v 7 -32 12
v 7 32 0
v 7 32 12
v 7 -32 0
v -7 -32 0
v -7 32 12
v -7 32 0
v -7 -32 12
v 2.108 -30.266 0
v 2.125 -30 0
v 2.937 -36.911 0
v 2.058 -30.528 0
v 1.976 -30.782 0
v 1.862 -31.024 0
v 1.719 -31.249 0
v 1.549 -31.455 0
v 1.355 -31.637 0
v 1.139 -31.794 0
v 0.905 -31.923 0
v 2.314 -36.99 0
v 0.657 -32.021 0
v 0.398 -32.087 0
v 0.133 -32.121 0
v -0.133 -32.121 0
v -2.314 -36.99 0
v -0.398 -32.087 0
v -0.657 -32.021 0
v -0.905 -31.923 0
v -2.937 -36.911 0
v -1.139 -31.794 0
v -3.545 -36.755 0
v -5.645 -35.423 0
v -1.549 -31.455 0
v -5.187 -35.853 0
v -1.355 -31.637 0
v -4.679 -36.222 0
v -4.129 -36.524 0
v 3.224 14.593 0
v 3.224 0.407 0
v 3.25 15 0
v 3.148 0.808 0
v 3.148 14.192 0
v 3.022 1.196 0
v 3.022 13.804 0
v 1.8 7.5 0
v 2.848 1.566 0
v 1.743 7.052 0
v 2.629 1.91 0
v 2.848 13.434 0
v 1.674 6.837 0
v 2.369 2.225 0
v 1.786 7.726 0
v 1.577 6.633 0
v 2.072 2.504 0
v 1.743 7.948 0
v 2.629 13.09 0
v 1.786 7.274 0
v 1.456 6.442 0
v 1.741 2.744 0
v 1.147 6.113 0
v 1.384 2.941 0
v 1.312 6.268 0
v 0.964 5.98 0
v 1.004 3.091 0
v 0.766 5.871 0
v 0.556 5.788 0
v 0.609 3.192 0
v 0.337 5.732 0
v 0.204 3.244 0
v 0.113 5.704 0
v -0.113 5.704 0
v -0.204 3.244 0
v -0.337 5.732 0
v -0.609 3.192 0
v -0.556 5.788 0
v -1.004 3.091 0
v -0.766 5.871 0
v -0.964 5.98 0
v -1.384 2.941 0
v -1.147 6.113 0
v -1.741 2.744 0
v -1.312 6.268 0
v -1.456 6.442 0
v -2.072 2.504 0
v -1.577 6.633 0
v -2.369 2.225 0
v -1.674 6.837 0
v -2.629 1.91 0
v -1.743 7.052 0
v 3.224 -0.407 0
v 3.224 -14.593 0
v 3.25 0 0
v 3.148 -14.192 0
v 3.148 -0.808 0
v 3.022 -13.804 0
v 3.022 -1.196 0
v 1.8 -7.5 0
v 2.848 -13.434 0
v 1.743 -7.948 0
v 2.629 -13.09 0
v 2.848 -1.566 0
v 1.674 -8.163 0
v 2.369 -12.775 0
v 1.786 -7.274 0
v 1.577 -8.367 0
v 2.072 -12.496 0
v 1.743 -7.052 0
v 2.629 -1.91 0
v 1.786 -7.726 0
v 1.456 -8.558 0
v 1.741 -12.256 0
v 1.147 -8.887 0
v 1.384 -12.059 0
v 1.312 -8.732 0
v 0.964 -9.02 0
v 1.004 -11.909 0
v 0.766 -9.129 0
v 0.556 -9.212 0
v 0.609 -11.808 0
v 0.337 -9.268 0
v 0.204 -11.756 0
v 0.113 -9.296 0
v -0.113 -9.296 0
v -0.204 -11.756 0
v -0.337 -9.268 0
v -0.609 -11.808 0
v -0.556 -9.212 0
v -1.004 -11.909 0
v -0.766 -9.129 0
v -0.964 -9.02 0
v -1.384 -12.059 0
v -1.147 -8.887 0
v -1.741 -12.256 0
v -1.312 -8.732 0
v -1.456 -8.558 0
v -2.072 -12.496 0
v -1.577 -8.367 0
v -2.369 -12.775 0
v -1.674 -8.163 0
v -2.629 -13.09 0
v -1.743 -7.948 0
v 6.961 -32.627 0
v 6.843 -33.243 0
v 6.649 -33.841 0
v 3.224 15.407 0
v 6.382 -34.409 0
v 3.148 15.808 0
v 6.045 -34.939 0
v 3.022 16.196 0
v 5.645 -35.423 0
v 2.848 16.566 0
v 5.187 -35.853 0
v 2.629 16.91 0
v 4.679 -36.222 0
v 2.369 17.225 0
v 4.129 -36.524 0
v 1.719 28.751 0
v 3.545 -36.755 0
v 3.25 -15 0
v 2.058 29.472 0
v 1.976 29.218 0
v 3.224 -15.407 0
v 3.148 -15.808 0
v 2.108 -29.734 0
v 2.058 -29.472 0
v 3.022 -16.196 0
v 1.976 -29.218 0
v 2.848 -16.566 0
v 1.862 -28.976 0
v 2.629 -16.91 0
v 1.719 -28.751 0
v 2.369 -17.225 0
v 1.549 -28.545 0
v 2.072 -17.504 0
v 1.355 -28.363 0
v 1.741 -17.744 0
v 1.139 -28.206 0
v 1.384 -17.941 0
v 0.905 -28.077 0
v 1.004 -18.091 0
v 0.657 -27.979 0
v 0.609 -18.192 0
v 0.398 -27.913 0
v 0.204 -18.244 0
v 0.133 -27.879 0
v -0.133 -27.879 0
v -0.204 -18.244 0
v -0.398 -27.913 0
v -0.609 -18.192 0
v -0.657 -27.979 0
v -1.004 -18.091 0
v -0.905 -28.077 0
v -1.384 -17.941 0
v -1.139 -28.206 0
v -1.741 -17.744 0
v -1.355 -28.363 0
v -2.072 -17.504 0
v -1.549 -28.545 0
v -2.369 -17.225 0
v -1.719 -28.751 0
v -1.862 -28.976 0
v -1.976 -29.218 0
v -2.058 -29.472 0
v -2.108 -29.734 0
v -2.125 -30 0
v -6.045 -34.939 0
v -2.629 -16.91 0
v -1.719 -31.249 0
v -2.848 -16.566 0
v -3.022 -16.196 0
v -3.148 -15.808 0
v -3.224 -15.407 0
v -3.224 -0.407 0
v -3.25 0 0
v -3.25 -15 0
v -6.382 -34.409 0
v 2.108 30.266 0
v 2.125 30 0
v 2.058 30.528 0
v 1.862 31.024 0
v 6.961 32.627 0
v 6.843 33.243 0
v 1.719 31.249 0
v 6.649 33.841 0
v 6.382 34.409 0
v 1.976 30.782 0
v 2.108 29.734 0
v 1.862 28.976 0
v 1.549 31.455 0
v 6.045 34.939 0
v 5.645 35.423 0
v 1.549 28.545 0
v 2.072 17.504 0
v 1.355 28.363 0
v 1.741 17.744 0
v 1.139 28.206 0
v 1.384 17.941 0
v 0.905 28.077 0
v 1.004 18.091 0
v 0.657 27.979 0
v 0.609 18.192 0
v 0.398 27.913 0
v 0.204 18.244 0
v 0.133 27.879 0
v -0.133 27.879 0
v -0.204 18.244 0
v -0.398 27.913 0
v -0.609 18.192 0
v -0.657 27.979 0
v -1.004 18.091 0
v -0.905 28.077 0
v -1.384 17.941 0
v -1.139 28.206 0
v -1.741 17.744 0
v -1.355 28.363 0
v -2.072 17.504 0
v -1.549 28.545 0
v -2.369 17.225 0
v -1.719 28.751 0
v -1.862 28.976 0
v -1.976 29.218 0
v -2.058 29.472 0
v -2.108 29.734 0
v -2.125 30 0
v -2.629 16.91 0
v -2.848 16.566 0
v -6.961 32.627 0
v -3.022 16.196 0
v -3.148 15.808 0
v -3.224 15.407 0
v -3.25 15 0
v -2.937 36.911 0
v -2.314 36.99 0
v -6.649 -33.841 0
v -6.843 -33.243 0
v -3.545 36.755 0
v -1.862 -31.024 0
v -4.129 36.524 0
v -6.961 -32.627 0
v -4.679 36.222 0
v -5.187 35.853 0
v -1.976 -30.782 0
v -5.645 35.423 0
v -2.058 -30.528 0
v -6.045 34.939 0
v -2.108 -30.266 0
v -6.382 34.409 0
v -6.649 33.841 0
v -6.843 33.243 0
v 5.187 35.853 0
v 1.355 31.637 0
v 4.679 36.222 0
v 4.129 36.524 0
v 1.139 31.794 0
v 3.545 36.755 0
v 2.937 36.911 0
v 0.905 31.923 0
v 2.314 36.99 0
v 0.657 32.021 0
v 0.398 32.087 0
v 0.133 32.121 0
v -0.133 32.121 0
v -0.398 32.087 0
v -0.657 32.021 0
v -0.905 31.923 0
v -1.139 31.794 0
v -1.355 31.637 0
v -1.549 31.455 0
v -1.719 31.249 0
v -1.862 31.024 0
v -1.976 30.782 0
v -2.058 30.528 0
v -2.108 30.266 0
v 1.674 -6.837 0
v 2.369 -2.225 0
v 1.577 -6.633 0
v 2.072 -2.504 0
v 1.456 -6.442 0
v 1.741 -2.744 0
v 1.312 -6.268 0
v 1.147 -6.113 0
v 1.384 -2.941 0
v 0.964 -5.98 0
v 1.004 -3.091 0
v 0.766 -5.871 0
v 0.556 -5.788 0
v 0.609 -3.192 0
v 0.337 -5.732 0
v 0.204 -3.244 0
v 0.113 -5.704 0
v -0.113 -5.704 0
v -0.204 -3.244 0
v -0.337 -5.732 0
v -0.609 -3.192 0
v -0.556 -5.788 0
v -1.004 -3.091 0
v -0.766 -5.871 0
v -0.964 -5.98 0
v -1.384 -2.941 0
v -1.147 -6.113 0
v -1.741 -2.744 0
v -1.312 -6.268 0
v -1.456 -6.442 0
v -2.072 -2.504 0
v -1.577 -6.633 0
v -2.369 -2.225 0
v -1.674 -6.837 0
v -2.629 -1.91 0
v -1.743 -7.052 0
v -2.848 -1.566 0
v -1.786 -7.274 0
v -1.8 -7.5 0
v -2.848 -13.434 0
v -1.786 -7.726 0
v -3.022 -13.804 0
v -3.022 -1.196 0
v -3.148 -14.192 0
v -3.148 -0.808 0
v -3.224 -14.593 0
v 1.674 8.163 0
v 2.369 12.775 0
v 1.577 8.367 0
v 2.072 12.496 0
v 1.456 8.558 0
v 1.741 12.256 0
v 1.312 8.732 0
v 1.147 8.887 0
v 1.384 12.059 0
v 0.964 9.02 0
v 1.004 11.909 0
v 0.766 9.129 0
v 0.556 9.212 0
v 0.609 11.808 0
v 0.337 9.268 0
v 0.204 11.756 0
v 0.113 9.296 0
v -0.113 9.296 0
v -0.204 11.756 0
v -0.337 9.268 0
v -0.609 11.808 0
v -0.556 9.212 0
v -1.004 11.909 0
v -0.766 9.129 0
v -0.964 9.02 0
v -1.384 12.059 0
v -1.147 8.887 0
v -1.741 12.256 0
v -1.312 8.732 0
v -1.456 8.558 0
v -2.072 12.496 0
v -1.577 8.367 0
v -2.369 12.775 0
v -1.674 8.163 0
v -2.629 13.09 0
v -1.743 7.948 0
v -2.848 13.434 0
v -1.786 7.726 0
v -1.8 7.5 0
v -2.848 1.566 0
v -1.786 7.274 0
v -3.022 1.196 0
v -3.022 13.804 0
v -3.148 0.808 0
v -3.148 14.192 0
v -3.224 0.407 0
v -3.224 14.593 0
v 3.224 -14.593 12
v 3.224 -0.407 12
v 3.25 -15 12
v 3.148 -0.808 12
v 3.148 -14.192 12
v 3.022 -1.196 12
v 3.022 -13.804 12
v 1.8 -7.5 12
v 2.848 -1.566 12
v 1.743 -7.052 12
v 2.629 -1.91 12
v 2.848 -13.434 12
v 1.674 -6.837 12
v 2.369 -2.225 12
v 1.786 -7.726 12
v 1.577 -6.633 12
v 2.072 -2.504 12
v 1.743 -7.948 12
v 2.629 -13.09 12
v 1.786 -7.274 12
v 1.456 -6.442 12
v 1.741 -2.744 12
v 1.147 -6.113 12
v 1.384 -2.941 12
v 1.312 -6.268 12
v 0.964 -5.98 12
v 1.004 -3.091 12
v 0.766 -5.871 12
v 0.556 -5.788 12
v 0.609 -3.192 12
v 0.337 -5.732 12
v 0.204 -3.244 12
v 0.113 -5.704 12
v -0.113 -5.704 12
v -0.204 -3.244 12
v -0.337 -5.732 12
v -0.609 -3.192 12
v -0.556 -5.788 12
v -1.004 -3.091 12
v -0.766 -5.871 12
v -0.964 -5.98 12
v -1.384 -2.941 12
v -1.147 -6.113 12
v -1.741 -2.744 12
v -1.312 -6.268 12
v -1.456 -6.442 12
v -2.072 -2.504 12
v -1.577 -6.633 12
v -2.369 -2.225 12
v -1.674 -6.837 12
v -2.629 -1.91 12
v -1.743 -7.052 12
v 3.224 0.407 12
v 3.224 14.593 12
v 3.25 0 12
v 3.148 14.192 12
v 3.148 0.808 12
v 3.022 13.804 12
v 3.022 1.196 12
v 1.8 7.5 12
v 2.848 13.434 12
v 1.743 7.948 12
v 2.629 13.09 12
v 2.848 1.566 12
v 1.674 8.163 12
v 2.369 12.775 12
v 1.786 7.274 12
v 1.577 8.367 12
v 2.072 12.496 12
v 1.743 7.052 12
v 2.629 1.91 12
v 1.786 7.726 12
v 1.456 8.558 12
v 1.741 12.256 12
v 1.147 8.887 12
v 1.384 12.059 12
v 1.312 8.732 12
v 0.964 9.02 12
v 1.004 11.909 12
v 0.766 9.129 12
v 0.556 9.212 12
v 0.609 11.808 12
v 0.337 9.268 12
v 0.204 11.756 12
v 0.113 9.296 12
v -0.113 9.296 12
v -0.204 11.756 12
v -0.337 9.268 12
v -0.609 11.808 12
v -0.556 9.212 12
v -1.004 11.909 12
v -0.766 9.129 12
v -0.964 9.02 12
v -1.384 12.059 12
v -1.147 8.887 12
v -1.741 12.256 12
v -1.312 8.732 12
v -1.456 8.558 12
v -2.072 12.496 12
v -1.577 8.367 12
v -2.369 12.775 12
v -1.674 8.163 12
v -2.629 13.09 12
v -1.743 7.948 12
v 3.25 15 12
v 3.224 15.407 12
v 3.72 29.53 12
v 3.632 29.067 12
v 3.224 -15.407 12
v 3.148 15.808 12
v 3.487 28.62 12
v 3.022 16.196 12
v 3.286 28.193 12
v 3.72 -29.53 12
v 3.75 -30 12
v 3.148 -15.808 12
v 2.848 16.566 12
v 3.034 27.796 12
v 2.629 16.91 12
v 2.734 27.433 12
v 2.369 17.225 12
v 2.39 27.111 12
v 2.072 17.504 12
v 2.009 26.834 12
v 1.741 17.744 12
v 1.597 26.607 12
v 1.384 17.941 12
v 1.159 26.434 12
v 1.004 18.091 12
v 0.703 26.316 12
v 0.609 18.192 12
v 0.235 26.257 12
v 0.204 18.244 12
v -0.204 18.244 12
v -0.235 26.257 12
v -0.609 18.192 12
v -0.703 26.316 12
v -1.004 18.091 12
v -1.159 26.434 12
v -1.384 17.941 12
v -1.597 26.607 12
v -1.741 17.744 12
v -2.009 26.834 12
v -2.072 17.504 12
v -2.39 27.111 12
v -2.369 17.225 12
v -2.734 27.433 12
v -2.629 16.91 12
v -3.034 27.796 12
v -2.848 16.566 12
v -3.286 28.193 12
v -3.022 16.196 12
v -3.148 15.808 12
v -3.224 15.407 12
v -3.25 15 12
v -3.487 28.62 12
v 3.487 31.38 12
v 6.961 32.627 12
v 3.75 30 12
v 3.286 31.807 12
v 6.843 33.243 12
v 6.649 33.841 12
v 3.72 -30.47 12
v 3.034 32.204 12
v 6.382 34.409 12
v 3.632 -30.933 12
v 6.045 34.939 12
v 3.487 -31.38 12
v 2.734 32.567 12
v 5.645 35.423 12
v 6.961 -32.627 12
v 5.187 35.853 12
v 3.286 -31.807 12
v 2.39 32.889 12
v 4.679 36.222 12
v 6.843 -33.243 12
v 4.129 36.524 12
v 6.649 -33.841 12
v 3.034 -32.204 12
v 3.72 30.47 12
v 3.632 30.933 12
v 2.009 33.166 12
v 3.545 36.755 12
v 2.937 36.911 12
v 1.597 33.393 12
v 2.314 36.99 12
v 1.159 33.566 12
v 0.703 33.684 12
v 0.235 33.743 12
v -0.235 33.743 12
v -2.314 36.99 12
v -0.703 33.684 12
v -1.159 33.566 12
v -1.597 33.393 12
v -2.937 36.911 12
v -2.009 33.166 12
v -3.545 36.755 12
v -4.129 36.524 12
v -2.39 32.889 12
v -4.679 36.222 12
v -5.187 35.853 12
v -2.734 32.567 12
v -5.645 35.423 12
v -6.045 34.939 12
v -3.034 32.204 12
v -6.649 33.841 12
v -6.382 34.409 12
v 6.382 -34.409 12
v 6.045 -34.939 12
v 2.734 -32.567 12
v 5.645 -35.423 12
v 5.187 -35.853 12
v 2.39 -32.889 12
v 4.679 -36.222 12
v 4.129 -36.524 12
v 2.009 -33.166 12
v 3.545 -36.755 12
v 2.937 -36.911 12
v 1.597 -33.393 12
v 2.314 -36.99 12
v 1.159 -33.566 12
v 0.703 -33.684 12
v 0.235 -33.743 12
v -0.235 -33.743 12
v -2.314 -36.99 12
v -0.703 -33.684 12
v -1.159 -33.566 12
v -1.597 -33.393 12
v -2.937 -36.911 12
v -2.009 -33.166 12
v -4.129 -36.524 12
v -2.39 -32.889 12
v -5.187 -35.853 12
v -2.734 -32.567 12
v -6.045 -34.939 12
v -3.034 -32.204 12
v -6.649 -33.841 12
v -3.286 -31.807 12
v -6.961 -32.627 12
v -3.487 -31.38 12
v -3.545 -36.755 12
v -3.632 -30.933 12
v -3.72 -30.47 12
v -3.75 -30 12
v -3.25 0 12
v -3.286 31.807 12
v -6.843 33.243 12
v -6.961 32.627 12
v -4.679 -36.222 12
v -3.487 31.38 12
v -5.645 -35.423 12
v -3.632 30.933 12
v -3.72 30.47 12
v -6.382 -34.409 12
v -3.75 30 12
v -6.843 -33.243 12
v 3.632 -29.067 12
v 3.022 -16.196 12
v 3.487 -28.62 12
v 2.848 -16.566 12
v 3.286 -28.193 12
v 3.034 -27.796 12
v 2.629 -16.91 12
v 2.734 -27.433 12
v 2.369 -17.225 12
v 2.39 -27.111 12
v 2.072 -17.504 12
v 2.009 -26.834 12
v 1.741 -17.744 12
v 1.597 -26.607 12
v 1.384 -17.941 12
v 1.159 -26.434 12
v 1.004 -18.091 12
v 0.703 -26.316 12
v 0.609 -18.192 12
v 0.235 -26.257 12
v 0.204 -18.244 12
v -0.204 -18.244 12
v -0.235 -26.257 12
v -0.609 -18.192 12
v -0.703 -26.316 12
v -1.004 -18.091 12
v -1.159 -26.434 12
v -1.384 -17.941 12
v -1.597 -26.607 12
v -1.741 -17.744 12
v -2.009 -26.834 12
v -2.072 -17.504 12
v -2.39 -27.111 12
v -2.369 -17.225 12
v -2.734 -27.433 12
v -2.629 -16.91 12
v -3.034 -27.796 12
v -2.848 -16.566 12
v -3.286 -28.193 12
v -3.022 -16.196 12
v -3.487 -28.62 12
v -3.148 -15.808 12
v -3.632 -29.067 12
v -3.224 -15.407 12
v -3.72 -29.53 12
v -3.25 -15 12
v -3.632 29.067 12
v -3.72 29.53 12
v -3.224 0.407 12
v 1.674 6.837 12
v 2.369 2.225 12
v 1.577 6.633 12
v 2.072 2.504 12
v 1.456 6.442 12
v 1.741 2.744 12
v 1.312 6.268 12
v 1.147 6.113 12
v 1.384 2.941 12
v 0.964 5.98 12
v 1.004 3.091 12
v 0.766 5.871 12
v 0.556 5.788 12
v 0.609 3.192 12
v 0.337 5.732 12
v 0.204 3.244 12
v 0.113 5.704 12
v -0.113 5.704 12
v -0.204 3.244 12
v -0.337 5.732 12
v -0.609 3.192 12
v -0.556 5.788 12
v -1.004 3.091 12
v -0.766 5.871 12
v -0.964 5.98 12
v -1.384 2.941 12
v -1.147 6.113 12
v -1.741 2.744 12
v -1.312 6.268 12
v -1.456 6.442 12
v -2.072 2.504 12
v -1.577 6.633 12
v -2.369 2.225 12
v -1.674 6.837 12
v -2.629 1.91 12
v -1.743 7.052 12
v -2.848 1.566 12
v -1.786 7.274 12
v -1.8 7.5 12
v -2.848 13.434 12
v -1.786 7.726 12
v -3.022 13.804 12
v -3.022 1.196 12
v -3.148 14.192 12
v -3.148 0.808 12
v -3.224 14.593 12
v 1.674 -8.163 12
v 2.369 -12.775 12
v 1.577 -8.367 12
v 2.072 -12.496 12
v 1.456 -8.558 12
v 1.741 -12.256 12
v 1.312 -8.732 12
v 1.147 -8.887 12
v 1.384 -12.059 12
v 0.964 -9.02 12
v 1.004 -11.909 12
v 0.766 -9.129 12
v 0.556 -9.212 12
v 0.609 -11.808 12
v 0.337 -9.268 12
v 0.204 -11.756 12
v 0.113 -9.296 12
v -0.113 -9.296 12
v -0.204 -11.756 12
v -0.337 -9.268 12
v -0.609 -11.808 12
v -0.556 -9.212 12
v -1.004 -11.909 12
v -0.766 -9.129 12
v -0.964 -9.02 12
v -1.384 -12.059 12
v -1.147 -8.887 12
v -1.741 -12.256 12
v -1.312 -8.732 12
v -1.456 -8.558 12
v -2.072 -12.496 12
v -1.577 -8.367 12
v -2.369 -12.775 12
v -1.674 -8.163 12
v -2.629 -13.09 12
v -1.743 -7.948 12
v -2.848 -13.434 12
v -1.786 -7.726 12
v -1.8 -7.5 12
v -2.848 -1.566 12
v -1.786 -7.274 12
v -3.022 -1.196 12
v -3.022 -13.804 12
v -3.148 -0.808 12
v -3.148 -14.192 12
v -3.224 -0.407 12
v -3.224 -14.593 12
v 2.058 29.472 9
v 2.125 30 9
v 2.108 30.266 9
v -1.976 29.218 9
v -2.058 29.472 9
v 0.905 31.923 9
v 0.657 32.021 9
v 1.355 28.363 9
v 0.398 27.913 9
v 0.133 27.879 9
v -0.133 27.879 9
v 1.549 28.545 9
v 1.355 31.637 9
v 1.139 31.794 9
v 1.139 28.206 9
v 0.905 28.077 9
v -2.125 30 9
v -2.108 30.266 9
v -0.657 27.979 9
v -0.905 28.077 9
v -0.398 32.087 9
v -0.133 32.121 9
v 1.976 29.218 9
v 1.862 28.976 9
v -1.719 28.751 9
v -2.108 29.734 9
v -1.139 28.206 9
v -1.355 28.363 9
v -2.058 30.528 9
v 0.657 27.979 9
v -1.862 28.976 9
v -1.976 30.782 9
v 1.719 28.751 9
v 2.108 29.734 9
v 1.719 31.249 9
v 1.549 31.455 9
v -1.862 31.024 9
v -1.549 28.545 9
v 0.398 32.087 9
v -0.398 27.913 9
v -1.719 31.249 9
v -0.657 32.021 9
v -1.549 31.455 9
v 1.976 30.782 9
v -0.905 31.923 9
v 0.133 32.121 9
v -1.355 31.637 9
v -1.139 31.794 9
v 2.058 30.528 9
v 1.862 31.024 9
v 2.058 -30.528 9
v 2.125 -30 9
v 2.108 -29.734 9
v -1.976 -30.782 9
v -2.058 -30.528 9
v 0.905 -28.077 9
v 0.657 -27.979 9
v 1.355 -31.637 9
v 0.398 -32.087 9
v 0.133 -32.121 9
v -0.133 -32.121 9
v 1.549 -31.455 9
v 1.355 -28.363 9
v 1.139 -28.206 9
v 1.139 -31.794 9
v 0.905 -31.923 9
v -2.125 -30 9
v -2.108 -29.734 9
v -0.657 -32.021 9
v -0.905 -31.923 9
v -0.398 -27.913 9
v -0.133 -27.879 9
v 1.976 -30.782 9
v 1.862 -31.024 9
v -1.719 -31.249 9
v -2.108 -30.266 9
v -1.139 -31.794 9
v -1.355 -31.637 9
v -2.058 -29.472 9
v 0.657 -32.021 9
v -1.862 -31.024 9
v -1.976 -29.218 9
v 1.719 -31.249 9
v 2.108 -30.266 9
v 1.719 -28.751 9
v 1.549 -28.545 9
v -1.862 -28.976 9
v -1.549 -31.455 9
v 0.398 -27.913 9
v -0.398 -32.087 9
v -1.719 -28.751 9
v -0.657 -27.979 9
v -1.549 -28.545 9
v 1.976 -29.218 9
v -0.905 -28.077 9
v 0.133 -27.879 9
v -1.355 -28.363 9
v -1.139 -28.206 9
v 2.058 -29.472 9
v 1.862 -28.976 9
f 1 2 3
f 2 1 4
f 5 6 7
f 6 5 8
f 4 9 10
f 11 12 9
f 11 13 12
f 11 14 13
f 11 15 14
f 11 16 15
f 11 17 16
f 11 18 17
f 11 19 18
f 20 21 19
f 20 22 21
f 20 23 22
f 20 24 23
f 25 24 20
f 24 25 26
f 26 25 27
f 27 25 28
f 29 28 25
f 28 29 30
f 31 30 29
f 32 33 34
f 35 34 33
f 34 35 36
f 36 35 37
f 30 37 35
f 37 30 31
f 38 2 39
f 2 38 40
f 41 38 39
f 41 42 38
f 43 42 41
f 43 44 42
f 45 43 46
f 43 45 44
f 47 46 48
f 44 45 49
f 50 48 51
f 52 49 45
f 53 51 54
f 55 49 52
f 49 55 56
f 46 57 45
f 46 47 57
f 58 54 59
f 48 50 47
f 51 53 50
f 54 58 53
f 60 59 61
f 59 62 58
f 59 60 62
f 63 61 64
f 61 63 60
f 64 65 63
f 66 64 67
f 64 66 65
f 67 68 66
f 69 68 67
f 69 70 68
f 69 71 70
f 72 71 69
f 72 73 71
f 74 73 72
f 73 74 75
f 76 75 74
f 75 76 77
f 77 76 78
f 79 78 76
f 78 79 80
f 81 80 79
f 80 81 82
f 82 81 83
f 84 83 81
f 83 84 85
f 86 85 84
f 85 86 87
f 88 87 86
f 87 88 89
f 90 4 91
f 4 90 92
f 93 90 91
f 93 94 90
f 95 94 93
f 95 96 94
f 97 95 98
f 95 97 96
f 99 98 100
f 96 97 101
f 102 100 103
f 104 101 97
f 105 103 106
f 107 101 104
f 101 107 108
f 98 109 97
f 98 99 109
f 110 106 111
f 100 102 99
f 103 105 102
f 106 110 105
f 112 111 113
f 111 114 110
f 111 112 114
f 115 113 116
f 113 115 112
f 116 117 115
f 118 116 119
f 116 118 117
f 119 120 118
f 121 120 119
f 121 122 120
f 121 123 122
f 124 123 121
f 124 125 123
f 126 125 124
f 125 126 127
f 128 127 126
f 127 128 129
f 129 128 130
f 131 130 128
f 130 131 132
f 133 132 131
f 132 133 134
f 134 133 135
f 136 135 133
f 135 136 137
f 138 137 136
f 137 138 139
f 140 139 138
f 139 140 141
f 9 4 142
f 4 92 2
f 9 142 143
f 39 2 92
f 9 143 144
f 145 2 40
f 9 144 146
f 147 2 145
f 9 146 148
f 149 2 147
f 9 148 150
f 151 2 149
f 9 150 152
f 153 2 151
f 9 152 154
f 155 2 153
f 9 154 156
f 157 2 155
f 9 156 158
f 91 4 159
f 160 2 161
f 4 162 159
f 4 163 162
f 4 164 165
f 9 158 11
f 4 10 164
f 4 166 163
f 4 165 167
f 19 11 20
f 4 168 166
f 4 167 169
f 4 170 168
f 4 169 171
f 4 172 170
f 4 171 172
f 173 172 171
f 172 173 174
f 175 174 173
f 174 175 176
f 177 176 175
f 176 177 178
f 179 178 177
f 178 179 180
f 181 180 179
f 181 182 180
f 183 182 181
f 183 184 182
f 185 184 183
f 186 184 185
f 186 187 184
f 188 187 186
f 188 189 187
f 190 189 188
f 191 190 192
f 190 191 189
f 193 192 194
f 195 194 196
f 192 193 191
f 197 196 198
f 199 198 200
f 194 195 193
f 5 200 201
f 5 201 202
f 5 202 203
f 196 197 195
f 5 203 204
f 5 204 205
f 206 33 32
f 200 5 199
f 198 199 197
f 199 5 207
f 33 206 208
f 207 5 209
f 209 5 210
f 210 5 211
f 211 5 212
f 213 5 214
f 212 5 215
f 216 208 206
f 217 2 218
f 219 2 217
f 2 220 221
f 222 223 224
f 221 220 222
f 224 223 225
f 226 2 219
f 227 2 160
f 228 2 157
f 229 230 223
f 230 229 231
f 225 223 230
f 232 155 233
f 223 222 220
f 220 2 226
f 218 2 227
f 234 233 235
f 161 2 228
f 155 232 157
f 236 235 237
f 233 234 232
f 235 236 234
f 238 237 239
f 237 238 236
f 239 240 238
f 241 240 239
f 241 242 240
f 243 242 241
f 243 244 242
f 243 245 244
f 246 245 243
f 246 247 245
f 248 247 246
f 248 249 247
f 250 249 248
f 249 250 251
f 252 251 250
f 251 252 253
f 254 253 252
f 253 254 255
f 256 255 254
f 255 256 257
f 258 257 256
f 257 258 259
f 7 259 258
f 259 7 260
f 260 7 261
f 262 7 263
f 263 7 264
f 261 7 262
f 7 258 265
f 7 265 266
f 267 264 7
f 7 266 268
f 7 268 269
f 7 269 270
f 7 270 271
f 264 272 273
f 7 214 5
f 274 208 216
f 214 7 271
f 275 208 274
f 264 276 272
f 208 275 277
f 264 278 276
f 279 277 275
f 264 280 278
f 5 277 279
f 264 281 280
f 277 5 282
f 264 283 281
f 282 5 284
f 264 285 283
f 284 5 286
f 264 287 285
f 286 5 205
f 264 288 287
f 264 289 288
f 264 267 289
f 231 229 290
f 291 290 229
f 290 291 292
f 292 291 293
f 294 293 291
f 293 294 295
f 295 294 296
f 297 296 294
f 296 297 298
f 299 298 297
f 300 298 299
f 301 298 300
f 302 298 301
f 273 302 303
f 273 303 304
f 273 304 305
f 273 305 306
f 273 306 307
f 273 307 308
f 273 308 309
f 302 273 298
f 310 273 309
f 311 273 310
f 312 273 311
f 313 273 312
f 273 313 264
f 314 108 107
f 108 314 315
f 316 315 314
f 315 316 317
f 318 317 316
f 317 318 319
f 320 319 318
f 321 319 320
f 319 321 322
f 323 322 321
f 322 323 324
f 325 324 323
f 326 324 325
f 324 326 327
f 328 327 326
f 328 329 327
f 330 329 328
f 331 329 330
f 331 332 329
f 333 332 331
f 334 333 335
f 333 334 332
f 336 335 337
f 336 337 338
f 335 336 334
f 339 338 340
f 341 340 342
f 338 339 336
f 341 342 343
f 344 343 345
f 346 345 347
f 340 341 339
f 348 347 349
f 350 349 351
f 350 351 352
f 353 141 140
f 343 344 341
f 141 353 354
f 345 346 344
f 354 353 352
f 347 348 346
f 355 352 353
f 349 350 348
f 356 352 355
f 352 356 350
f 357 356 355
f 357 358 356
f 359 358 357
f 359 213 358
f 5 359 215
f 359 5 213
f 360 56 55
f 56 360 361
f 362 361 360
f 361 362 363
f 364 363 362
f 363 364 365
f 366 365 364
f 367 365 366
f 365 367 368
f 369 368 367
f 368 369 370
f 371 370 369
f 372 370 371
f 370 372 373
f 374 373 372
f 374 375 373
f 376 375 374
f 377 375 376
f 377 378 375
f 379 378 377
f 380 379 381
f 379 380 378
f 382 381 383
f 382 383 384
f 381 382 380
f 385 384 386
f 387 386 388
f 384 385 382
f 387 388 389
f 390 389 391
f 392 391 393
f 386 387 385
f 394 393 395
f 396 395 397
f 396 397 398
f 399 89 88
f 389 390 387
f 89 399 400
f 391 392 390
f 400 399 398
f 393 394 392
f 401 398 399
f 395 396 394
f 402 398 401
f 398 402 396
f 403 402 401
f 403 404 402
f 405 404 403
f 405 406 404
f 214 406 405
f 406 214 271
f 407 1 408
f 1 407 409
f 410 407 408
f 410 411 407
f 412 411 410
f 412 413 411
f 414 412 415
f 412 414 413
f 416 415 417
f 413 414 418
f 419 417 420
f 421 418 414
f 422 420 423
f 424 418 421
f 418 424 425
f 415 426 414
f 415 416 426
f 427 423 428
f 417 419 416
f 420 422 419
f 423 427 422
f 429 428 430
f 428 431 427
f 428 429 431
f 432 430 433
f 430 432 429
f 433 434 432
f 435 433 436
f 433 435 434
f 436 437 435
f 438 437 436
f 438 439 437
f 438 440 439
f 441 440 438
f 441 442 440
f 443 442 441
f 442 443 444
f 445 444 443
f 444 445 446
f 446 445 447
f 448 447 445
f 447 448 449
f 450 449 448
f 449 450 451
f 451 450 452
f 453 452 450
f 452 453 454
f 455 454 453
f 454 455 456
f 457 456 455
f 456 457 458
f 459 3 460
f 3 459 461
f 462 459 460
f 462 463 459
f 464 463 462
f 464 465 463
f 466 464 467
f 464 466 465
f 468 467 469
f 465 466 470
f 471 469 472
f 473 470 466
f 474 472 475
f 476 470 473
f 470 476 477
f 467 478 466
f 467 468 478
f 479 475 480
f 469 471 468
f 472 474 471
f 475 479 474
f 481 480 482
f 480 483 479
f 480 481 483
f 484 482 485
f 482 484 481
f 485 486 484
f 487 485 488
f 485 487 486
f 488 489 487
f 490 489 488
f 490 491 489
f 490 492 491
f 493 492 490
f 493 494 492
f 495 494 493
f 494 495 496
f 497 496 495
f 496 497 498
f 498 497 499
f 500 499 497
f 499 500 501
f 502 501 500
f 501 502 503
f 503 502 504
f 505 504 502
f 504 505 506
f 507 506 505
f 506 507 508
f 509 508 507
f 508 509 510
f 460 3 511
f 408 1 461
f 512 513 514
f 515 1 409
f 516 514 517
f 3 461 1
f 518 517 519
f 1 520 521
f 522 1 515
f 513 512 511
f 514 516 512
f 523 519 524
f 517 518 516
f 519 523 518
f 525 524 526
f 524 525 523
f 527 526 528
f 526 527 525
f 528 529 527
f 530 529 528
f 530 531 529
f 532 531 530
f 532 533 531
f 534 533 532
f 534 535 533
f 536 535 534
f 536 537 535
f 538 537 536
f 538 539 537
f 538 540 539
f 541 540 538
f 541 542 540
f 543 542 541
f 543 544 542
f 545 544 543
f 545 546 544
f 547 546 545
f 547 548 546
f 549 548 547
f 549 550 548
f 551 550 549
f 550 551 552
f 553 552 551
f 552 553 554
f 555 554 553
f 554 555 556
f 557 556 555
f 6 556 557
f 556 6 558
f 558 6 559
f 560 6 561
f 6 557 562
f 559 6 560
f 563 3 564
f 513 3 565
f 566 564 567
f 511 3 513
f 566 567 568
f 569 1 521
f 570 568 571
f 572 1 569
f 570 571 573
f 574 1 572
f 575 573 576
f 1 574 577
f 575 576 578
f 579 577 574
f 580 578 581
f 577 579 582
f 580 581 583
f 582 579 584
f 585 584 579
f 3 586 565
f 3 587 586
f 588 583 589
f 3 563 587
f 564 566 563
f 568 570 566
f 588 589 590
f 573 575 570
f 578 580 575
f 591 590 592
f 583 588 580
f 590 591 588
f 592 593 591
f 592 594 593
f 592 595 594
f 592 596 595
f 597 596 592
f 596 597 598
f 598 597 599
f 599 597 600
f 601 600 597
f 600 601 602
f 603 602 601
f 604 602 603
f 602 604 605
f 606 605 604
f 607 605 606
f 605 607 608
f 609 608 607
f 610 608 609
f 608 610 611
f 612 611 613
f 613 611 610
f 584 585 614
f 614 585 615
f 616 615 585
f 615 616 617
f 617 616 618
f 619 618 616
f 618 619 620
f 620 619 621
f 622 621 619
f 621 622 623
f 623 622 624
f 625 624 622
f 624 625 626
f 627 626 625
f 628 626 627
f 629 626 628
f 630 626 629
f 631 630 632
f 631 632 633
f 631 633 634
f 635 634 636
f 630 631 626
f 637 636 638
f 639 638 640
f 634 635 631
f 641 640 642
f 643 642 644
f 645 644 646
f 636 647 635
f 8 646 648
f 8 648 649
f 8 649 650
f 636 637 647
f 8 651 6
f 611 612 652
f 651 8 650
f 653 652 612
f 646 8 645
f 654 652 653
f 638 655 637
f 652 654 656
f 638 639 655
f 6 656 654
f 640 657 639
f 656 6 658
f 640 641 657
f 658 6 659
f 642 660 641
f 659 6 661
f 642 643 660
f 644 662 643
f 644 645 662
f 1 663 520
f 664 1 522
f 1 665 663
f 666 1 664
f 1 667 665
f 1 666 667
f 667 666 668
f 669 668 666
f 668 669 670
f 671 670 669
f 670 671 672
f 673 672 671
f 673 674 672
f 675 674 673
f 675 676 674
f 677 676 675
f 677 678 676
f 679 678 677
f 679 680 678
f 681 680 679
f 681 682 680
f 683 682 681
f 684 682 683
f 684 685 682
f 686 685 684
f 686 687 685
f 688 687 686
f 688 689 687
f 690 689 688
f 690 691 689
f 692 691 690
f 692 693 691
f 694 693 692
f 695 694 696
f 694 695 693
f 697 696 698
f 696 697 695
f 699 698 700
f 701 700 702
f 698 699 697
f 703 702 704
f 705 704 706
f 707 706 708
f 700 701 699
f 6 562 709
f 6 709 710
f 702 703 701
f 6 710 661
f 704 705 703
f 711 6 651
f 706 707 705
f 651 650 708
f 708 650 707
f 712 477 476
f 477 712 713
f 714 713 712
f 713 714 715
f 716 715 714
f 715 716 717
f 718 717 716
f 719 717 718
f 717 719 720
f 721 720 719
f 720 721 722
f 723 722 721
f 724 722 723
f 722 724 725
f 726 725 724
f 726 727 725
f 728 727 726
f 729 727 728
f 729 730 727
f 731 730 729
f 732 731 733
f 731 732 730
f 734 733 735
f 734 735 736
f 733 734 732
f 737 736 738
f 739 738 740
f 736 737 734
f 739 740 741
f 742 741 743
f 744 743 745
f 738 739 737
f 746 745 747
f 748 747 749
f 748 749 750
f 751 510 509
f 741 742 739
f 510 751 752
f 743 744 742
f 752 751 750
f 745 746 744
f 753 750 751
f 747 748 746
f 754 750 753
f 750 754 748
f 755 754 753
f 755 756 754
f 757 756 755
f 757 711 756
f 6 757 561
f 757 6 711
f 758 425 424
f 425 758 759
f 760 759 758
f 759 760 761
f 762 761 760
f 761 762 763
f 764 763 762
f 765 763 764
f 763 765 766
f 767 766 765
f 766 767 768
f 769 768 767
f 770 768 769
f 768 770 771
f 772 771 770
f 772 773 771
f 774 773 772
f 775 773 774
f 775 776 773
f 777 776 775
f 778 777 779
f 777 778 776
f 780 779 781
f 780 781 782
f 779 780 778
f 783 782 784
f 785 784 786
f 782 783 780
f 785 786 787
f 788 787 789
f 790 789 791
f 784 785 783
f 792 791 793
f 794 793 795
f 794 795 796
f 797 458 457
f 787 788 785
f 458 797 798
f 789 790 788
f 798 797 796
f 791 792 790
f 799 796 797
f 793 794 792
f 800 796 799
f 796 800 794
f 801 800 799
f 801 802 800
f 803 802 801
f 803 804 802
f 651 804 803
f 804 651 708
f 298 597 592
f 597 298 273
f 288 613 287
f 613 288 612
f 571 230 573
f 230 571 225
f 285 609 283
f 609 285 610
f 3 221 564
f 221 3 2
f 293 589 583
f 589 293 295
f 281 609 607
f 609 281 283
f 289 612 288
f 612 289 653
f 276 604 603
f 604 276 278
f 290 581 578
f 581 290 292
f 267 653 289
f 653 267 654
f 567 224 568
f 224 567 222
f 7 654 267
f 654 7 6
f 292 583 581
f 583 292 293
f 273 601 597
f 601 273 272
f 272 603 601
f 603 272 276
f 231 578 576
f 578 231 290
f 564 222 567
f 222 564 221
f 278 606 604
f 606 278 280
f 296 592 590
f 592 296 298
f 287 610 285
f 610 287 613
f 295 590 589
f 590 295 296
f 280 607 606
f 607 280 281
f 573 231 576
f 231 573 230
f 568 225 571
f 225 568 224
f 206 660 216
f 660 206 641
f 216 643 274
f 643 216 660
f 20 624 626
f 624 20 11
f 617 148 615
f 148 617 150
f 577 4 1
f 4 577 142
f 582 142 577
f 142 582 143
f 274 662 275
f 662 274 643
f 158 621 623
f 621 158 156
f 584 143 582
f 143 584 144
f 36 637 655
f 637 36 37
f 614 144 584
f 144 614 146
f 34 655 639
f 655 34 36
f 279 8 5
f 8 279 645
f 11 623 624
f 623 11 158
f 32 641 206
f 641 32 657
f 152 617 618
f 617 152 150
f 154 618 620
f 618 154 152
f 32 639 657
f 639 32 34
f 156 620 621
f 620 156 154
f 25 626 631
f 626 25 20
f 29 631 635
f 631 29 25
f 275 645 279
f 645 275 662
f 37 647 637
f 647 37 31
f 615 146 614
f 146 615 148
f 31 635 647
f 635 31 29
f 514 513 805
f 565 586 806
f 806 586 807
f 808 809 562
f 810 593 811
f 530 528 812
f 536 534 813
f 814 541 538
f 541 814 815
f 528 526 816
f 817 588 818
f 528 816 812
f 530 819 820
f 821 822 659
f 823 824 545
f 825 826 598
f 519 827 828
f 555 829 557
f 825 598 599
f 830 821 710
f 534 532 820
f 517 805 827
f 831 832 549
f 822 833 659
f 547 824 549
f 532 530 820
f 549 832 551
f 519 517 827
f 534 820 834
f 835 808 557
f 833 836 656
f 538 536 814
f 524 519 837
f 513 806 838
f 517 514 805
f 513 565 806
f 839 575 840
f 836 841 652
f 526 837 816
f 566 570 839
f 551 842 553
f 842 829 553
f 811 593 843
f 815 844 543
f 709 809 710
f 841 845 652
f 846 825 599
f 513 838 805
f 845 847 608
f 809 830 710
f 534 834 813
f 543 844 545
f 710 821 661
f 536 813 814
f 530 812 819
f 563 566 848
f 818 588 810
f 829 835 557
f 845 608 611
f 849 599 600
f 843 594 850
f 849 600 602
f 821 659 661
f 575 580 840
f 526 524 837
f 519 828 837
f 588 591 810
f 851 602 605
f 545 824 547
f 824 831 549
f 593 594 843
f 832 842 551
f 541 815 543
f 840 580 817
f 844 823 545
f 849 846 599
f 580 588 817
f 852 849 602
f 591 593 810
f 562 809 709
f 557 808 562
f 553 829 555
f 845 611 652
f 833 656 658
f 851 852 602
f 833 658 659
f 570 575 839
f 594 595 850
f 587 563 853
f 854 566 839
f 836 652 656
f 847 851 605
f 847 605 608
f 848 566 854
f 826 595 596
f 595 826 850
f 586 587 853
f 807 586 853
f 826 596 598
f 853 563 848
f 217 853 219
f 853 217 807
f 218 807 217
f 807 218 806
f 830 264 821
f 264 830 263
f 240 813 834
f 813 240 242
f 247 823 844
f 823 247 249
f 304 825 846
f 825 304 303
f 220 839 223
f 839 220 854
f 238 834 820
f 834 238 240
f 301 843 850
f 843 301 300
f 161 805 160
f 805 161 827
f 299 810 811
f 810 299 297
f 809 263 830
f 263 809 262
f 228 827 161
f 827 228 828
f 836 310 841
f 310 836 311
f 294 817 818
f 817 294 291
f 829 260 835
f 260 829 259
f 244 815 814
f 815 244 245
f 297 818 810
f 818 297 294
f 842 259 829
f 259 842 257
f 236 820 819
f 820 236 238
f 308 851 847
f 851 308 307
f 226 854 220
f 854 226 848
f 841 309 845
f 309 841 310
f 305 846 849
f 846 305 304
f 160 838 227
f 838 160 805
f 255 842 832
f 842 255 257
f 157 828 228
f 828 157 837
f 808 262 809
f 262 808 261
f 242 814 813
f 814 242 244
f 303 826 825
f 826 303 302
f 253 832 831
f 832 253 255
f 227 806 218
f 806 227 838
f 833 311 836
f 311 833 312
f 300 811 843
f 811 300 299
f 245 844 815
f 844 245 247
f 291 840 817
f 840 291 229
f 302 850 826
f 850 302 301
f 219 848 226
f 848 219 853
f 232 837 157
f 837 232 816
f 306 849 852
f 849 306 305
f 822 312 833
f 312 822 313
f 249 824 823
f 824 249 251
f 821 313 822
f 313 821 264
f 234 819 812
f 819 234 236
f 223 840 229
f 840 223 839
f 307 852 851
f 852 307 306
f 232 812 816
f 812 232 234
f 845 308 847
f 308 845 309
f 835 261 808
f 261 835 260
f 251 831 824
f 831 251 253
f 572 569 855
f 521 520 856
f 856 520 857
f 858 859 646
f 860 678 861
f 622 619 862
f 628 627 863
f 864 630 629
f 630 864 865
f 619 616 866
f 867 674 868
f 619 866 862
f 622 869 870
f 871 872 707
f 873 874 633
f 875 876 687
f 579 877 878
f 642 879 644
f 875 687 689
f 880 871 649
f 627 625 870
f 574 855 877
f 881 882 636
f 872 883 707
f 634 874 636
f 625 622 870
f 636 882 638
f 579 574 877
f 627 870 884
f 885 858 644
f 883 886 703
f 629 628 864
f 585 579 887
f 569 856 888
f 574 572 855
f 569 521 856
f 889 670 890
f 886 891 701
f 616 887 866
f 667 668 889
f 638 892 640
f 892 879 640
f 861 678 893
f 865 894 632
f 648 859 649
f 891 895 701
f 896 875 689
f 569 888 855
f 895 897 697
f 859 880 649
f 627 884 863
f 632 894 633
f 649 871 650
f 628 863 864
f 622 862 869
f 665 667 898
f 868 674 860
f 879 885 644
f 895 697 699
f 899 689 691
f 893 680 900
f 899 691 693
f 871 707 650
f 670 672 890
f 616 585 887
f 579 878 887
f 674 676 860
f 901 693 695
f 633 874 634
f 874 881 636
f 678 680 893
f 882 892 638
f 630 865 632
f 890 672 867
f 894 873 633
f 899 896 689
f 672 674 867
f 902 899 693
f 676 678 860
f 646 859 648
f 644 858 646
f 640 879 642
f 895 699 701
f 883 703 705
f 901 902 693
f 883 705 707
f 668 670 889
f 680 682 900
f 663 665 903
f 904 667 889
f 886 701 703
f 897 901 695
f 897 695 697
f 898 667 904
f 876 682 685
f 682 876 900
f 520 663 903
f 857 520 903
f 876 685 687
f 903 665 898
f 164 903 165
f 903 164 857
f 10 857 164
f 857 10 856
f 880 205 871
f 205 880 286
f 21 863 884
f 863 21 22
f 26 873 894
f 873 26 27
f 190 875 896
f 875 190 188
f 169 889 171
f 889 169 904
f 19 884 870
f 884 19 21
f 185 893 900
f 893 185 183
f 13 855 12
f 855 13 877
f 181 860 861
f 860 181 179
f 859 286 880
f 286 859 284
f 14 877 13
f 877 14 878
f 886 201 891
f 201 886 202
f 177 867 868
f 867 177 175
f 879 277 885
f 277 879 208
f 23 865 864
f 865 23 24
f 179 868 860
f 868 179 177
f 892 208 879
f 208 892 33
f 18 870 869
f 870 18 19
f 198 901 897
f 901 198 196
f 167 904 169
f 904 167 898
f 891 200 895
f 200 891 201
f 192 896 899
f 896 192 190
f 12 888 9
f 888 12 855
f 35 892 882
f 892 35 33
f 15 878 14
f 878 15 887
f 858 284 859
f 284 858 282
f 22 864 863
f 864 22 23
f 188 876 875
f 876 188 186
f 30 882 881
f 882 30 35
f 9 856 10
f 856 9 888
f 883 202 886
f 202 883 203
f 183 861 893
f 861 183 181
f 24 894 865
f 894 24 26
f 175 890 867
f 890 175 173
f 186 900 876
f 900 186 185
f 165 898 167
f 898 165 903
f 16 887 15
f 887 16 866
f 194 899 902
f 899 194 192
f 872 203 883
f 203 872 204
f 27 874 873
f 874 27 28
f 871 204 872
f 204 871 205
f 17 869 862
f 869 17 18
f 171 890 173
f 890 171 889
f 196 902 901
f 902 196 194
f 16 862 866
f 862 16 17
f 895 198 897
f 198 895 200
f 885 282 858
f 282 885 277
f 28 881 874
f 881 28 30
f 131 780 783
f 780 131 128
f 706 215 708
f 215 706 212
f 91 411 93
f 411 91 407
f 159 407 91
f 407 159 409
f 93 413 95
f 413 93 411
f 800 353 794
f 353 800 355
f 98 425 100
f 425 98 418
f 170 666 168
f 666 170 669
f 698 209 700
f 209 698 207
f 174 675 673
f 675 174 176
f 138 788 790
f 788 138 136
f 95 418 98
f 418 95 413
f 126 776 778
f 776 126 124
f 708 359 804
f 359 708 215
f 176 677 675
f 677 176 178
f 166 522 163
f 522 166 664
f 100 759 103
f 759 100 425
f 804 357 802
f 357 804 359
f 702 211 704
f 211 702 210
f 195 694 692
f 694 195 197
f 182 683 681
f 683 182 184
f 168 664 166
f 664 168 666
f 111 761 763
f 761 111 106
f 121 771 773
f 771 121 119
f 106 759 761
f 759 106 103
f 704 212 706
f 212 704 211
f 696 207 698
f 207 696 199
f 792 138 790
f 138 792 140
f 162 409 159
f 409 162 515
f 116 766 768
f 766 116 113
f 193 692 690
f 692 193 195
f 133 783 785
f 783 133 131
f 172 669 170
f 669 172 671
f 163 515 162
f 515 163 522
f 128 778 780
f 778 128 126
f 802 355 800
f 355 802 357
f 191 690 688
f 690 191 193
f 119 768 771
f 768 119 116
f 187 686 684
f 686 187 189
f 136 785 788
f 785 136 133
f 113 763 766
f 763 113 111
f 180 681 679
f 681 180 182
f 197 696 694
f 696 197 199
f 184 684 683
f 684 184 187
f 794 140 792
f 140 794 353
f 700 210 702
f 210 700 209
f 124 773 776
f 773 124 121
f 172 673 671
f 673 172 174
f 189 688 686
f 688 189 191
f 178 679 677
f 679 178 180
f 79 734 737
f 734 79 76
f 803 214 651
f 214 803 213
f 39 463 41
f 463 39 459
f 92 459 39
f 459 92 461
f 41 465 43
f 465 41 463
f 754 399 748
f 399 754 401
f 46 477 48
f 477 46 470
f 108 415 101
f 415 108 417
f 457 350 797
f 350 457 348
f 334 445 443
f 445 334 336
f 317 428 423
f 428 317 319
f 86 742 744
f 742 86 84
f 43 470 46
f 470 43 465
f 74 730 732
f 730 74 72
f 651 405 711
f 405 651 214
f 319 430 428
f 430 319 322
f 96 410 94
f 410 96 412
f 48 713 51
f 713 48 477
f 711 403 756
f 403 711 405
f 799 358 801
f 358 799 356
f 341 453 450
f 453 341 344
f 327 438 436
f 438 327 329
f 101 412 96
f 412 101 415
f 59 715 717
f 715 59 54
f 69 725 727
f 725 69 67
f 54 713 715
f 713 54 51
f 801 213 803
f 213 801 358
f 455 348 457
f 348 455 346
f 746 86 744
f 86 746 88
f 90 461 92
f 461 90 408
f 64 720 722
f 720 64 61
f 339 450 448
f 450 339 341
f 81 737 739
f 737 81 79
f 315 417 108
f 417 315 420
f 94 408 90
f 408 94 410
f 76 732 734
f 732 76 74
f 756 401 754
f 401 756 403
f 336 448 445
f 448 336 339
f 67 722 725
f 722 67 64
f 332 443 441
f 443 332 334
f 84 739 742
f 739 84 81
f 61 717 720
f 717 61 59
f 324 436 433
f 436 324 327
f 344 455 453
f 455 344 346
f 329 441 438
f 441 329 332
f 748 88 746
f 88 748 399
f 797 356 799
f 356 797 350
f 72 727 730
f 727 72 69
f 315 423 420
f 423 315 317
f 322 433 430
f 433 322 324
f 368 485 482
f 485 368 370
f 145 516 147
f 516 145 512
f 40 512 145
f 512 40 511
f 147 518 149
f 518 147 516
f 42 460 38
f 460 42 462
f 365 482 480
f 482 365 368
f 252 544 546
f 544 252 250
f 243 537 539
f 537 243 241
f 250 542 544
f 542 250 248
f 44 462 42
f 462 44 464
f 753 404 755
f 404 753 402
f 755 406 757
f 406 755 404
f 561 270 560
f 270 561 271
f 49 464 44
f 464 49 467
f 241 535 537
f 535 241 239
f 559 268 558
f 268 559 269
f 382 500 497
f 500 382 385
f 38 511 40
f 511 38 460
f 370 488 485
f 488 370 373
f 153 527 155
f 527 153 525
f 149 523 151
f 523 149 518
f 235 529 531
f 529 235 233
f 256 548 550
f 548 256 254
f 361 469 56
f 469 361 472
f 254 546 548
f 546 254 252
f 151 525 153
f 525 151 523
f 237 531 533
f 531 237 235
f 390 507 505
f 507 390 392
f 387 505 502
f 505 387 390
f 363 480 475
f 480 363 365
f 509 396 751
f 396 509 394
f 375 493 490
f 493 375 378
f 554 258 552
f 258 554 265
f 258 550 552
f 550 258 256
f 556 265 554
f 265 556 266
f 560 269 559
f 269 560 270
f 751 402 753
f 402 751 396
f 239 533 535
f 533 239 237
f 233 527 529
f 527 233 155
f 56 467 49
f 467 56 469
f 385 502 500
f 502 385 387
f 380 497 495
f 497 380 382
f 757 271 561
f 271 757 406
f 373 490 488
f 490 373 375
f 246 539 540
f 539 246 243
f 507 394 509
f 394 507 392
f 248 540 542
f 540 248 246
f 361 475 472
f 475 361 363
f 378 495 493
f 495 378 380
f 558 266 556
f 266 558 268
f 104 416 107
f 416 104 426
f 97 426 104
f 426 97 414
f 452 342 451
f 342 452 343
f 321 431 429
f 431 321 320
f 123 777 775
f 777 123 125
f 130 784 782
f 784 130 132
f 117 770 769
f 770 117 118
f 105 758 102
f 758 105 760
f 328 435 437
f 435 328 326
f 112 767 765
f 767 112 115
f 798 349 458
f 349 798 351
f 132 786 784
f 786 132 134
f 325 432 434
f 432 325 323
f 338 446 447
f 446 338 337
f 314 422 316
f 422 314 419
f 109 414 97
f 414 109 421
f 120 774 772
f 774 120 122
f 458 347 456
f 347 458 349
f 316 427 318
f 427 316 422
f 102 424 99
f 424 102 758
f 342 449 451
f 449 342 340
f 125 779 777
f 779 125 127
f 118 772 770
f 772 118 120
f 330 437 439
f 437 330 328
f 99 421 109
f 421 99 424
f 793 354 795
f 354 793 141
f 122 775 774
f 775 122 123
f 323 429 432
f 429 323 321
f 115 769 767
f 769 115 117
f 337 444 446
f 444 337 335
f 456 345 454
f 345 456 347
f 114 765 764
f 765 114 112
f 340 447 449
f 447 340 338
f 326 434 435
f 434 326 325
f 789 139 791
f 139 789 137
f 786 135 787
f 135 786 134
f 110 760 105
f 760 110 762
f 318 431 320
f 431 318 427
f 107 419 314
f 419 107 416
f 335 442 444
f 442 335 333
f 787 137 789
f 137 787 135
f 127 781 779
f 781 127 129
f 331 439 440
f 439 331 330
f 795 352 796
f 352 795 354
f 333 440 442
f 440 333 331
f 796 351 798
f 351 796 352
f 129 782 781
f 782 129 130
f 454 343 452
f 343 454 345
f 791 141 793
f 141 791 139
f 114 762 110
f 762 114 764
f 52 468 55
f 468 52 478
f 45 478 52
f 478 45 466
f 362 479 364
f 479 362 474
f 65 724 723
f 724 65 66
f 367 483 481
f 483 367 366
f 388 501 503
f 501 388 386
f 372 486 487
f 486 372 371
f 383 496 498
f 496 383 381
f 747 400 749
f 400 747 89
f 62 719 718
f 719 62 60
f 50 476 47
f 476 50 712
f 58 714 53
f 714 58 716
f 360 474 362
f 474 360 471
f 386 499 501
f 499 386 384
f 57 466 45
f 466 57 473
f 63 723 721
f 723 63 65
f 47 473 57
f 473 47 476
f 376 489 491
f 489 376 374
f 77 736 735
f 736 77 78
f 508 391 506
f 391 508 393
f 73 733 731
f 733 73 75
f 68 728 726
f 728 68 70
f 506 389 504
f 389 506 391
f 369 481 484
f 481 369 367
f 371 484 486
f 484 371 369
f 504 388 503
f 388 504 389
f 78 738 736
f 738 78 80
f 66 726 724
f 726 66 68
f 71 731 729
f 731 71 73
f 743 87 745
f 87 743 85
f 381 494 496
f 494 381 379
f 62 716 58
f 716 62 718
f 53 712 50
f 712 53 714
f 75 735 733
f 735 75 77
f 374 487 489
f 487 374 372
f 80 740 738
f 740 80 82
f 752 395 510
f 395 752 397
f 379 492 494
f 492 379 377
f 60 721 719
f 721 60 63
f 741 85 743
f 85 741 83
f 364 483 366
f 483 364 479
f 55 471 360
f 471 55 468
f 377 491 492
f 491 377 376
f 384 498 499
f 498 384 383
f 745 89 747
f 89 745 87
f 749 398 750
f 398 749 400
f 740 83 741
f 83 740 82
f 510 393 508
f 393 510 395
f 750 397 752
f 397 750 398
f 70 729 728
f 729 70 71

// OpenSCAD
$fn = 50;


difference() {
	union() {
		hull() {
			translate(v = [-2.0000000000, 17.0000000000, 0]) {
				cylinder(h = 12, r = 5);
			}
			translate(v = [2.0000000000, 17.0000000000, 0]) {
				cylinder(h = 12, r = 5);
			}
			translate(v = [-2.0000000000, -17.0000000000, 0]) {
				cylinder(h = 12, r = 5);
			}
			translate(v = [2.0000000000, -17.0000000000, 0]) {
				cylinder(h = 12, r = 5);
			}
		}
		translate(v = [0.0000000000, 22.5000000000, 0]) {
			hull() {
				translate(v = [-2.0000000000, 9.5000000000, 0]) {
					cylinder(h = 12, r = 5);
				}
				translate(v = [2.0000000000, 9.5000000000, 0]) {
					cylinder(h = 12, r = 5);
				}
				translate(v = [-2.0000000000, -9.5000000000, 0]) {
					cylinder(h = 12, r = 5);
				}
				translate(v = [2.0000000000, -9.5000000000, 0]) {
					cylinder(h = 12, r = 5);
				}
			}
		}
		translate(v = [0.0000000000, 22.5000000000, 0]) {
			hull() {
				translate(v = [-2.0000000000, 9.5000000000, 0]) {
					cylinder(h = 12, r = 5);
				}
				translate(v = [2.0000000000, 9.5000000000, 0]) {
					cylinder(h = 12, r = 5);
				}
				translate(v = [-2.0000000000, -9.5000000000, 0]) {
					cylinder(h = 12, r = 5);
				}
				translate(v = [2.0000000000, -9.5000000000, 0]) {
					cylinder(h = 12, r = 5);
				}
			}
		}
		translate(v = [0.0000000000, -22.5000000000, 0]) {
			hull() {
				translate(v = [-2.0000000000, 9.5000000000, 0]) {
					cylinder(h = 12, r = 5);
				}
				translate(v = [2.0000000000, 9.5000000000, 0]) {
					cylinder(h = 12, r = 5);
				}
				translate(v = [-2.0000000000, -9.5000000000, 0]) {
					cylinder(h = 12, r = 5);
				}
				translate(v = [2.0000000000, -9.5000000000, 0]) {
					cylinder(h = 12, r = 5);
				}
			}
		}
		translate(v = [0.0000000000, -22.5000000000, 0]) {
			hull() {
				translate(v = [-2.0000000000, 9.5000000000, 0]) {
					cylinder(h = 12, r = 5);
				}
				translate(v = [2.0000000000, 9.5000000000, 0]) {
					cylinder(h = 12, r = 5);
				}
				translate(v = [-2.0000000000, -9.5000000000, 0]) {
					cylinder(h = 12, r = 5);
				}
				translate(v = [2.0000000000, -9.5000000000, 0]) {
					cylinder(h = 12, r = 5);
				}
			}
		}
	}
	union() {
		translate(v = [0.0000000000, 30.0000000000, 12]) {
			rotate(a = [0, 0, 0]) {
				difference() {
					union() {
						#translate(v = [0, 0, -12.0000000000]) {
							cylinder(h = 12, r = 2.0000000000);
						}
						#translate(v = [0, 0, -3]) {
							cylinder(h = 3, r1 = 2.1250000000, r2 = 3.7500000000);
						}
						#translate(v = [0, 0, -12.0000000000]) {
							cylinder(h = 12, r = 2.1250000000);
						}
						#translate(v = [0, 0, -12.0000000000]) {
							cylinder(h = 12, r = 2.0000000000);
						}
					}
					union();
				}
			}
		}
		translate(v = [0.0000000000, 30.0000000000, 12]) {
			rotate(a = [0, 0, 0]) {
				difference() {
					union() {
						#translate(v = [0, 0, -12.0000000000]) {
							cylinder(h = 12, r = 2.0000000000);
						}
						#translate(v = [0, 0, -3]) {
							cylinder(h = 3, r1 = 2.1250000000, r2 = 3.7500000000);
						}
						#translate(v = [0, 0, -12.0000000000]) {
							cylinder(h = 12, r = 2.1250000000);
						}
						#translate(v = [0, 0, -12.0000000000]) {
							cylinder(h = 12, r = 2.0000000000);
						}
					}
					union();
				}
			}
		}
		translate(v = [0.0000000000, -30.0000000000, 12]) {
			rotate(a = [0, 0, 0]) {
				difference() {
					union() {
						#translate(v = [0, 0, -12.0000000000]) {
							cylinder(h = 12, r = 2.0000000000);
						}
						#translate(v = [0, 0, -3]) {
							cylinder(h = 3, r1 = 2.1250000000, r2 = 3.7500000000);
						}
						#translate(v = [0, 0, -12.0000000000]) {
							cylinder(h = 12, r = 2.1250000000);
						}
						#translate(v = [0, 0, -12.0000000000]) {
							cylinder(h = 12, r = 2.0000000000);
						}
					}
					union();
				}
			}
		}
		translate(v = [0.0000000000, -30.0000000000, 12]) {
			rotate(a = [0, 0, 0]) {
				difference() {
					union() {
						#translate(v = [0, 0, -12.0000000000]) {
							cylinder(h = 12, r = 2.0000000000);
						}
						#translate(v = [0, 0, -3]) {
							cylinder(h = 3, r1 = 2.1250000000, r2 = 3.7500000000);
						}
						#translate(v = [0, 0, -12.0000000000]) {
							cylinder(h = 12, r = 2.1250000000);
						}
						#translate(v = [0, 0, -12.0000000000]) {
							cylinder(h = 12, r = 2.0000000000);
						}
					}
					union();
				}
			}
		}
		translate(v = [0.0000000000, -15.0000000000, 0]) {
			translate(v = [0, 0, -100]) {
				cylinder(h = 200, r = 3.2500000000);
			}
		}
		translate(v = [0, 0, -100]) {
			cylinder(h = 200, r = 3.2500000000);
		}
		translate(v = [0.0000000000, 15.0000000000, 0]) {
			translate(v = [0, 0, -100]) {
				cylinder(h = 200, r = 3.2500000000);
			}
		}
		translate(v = [0.0000000000, -15.0000000000, 0]) {
			translate(v = [0, 0, -100]) {
				cylinder(h = 200, r = 1.8000000000);
			}
		}
		translate(v = [0.0000000000, -7.5000000000, 0]) {
			translate(v = [0, 0, -100]) {
				cylinder(h = 200, r = 1.8000000000);
			}
		}
		translate(v = [0, 0, -100]) {
			cylinder(h = 200, r = 1.8000000000);
		}
		translate(v = [0.0000000000, 7.5000000000, 0]) {
			translate(v = [0, 0, -100]) {
				cylinder(h = 200, r = 1.8000000000);
			}
		}
		translate(v = [0.0000000000, 15.0000000000, 0]) {
			translate(v = [0, 0, -100]) {
				cylinder(h = 200, r = 1.8000000000);
			}
		}
	}
}
